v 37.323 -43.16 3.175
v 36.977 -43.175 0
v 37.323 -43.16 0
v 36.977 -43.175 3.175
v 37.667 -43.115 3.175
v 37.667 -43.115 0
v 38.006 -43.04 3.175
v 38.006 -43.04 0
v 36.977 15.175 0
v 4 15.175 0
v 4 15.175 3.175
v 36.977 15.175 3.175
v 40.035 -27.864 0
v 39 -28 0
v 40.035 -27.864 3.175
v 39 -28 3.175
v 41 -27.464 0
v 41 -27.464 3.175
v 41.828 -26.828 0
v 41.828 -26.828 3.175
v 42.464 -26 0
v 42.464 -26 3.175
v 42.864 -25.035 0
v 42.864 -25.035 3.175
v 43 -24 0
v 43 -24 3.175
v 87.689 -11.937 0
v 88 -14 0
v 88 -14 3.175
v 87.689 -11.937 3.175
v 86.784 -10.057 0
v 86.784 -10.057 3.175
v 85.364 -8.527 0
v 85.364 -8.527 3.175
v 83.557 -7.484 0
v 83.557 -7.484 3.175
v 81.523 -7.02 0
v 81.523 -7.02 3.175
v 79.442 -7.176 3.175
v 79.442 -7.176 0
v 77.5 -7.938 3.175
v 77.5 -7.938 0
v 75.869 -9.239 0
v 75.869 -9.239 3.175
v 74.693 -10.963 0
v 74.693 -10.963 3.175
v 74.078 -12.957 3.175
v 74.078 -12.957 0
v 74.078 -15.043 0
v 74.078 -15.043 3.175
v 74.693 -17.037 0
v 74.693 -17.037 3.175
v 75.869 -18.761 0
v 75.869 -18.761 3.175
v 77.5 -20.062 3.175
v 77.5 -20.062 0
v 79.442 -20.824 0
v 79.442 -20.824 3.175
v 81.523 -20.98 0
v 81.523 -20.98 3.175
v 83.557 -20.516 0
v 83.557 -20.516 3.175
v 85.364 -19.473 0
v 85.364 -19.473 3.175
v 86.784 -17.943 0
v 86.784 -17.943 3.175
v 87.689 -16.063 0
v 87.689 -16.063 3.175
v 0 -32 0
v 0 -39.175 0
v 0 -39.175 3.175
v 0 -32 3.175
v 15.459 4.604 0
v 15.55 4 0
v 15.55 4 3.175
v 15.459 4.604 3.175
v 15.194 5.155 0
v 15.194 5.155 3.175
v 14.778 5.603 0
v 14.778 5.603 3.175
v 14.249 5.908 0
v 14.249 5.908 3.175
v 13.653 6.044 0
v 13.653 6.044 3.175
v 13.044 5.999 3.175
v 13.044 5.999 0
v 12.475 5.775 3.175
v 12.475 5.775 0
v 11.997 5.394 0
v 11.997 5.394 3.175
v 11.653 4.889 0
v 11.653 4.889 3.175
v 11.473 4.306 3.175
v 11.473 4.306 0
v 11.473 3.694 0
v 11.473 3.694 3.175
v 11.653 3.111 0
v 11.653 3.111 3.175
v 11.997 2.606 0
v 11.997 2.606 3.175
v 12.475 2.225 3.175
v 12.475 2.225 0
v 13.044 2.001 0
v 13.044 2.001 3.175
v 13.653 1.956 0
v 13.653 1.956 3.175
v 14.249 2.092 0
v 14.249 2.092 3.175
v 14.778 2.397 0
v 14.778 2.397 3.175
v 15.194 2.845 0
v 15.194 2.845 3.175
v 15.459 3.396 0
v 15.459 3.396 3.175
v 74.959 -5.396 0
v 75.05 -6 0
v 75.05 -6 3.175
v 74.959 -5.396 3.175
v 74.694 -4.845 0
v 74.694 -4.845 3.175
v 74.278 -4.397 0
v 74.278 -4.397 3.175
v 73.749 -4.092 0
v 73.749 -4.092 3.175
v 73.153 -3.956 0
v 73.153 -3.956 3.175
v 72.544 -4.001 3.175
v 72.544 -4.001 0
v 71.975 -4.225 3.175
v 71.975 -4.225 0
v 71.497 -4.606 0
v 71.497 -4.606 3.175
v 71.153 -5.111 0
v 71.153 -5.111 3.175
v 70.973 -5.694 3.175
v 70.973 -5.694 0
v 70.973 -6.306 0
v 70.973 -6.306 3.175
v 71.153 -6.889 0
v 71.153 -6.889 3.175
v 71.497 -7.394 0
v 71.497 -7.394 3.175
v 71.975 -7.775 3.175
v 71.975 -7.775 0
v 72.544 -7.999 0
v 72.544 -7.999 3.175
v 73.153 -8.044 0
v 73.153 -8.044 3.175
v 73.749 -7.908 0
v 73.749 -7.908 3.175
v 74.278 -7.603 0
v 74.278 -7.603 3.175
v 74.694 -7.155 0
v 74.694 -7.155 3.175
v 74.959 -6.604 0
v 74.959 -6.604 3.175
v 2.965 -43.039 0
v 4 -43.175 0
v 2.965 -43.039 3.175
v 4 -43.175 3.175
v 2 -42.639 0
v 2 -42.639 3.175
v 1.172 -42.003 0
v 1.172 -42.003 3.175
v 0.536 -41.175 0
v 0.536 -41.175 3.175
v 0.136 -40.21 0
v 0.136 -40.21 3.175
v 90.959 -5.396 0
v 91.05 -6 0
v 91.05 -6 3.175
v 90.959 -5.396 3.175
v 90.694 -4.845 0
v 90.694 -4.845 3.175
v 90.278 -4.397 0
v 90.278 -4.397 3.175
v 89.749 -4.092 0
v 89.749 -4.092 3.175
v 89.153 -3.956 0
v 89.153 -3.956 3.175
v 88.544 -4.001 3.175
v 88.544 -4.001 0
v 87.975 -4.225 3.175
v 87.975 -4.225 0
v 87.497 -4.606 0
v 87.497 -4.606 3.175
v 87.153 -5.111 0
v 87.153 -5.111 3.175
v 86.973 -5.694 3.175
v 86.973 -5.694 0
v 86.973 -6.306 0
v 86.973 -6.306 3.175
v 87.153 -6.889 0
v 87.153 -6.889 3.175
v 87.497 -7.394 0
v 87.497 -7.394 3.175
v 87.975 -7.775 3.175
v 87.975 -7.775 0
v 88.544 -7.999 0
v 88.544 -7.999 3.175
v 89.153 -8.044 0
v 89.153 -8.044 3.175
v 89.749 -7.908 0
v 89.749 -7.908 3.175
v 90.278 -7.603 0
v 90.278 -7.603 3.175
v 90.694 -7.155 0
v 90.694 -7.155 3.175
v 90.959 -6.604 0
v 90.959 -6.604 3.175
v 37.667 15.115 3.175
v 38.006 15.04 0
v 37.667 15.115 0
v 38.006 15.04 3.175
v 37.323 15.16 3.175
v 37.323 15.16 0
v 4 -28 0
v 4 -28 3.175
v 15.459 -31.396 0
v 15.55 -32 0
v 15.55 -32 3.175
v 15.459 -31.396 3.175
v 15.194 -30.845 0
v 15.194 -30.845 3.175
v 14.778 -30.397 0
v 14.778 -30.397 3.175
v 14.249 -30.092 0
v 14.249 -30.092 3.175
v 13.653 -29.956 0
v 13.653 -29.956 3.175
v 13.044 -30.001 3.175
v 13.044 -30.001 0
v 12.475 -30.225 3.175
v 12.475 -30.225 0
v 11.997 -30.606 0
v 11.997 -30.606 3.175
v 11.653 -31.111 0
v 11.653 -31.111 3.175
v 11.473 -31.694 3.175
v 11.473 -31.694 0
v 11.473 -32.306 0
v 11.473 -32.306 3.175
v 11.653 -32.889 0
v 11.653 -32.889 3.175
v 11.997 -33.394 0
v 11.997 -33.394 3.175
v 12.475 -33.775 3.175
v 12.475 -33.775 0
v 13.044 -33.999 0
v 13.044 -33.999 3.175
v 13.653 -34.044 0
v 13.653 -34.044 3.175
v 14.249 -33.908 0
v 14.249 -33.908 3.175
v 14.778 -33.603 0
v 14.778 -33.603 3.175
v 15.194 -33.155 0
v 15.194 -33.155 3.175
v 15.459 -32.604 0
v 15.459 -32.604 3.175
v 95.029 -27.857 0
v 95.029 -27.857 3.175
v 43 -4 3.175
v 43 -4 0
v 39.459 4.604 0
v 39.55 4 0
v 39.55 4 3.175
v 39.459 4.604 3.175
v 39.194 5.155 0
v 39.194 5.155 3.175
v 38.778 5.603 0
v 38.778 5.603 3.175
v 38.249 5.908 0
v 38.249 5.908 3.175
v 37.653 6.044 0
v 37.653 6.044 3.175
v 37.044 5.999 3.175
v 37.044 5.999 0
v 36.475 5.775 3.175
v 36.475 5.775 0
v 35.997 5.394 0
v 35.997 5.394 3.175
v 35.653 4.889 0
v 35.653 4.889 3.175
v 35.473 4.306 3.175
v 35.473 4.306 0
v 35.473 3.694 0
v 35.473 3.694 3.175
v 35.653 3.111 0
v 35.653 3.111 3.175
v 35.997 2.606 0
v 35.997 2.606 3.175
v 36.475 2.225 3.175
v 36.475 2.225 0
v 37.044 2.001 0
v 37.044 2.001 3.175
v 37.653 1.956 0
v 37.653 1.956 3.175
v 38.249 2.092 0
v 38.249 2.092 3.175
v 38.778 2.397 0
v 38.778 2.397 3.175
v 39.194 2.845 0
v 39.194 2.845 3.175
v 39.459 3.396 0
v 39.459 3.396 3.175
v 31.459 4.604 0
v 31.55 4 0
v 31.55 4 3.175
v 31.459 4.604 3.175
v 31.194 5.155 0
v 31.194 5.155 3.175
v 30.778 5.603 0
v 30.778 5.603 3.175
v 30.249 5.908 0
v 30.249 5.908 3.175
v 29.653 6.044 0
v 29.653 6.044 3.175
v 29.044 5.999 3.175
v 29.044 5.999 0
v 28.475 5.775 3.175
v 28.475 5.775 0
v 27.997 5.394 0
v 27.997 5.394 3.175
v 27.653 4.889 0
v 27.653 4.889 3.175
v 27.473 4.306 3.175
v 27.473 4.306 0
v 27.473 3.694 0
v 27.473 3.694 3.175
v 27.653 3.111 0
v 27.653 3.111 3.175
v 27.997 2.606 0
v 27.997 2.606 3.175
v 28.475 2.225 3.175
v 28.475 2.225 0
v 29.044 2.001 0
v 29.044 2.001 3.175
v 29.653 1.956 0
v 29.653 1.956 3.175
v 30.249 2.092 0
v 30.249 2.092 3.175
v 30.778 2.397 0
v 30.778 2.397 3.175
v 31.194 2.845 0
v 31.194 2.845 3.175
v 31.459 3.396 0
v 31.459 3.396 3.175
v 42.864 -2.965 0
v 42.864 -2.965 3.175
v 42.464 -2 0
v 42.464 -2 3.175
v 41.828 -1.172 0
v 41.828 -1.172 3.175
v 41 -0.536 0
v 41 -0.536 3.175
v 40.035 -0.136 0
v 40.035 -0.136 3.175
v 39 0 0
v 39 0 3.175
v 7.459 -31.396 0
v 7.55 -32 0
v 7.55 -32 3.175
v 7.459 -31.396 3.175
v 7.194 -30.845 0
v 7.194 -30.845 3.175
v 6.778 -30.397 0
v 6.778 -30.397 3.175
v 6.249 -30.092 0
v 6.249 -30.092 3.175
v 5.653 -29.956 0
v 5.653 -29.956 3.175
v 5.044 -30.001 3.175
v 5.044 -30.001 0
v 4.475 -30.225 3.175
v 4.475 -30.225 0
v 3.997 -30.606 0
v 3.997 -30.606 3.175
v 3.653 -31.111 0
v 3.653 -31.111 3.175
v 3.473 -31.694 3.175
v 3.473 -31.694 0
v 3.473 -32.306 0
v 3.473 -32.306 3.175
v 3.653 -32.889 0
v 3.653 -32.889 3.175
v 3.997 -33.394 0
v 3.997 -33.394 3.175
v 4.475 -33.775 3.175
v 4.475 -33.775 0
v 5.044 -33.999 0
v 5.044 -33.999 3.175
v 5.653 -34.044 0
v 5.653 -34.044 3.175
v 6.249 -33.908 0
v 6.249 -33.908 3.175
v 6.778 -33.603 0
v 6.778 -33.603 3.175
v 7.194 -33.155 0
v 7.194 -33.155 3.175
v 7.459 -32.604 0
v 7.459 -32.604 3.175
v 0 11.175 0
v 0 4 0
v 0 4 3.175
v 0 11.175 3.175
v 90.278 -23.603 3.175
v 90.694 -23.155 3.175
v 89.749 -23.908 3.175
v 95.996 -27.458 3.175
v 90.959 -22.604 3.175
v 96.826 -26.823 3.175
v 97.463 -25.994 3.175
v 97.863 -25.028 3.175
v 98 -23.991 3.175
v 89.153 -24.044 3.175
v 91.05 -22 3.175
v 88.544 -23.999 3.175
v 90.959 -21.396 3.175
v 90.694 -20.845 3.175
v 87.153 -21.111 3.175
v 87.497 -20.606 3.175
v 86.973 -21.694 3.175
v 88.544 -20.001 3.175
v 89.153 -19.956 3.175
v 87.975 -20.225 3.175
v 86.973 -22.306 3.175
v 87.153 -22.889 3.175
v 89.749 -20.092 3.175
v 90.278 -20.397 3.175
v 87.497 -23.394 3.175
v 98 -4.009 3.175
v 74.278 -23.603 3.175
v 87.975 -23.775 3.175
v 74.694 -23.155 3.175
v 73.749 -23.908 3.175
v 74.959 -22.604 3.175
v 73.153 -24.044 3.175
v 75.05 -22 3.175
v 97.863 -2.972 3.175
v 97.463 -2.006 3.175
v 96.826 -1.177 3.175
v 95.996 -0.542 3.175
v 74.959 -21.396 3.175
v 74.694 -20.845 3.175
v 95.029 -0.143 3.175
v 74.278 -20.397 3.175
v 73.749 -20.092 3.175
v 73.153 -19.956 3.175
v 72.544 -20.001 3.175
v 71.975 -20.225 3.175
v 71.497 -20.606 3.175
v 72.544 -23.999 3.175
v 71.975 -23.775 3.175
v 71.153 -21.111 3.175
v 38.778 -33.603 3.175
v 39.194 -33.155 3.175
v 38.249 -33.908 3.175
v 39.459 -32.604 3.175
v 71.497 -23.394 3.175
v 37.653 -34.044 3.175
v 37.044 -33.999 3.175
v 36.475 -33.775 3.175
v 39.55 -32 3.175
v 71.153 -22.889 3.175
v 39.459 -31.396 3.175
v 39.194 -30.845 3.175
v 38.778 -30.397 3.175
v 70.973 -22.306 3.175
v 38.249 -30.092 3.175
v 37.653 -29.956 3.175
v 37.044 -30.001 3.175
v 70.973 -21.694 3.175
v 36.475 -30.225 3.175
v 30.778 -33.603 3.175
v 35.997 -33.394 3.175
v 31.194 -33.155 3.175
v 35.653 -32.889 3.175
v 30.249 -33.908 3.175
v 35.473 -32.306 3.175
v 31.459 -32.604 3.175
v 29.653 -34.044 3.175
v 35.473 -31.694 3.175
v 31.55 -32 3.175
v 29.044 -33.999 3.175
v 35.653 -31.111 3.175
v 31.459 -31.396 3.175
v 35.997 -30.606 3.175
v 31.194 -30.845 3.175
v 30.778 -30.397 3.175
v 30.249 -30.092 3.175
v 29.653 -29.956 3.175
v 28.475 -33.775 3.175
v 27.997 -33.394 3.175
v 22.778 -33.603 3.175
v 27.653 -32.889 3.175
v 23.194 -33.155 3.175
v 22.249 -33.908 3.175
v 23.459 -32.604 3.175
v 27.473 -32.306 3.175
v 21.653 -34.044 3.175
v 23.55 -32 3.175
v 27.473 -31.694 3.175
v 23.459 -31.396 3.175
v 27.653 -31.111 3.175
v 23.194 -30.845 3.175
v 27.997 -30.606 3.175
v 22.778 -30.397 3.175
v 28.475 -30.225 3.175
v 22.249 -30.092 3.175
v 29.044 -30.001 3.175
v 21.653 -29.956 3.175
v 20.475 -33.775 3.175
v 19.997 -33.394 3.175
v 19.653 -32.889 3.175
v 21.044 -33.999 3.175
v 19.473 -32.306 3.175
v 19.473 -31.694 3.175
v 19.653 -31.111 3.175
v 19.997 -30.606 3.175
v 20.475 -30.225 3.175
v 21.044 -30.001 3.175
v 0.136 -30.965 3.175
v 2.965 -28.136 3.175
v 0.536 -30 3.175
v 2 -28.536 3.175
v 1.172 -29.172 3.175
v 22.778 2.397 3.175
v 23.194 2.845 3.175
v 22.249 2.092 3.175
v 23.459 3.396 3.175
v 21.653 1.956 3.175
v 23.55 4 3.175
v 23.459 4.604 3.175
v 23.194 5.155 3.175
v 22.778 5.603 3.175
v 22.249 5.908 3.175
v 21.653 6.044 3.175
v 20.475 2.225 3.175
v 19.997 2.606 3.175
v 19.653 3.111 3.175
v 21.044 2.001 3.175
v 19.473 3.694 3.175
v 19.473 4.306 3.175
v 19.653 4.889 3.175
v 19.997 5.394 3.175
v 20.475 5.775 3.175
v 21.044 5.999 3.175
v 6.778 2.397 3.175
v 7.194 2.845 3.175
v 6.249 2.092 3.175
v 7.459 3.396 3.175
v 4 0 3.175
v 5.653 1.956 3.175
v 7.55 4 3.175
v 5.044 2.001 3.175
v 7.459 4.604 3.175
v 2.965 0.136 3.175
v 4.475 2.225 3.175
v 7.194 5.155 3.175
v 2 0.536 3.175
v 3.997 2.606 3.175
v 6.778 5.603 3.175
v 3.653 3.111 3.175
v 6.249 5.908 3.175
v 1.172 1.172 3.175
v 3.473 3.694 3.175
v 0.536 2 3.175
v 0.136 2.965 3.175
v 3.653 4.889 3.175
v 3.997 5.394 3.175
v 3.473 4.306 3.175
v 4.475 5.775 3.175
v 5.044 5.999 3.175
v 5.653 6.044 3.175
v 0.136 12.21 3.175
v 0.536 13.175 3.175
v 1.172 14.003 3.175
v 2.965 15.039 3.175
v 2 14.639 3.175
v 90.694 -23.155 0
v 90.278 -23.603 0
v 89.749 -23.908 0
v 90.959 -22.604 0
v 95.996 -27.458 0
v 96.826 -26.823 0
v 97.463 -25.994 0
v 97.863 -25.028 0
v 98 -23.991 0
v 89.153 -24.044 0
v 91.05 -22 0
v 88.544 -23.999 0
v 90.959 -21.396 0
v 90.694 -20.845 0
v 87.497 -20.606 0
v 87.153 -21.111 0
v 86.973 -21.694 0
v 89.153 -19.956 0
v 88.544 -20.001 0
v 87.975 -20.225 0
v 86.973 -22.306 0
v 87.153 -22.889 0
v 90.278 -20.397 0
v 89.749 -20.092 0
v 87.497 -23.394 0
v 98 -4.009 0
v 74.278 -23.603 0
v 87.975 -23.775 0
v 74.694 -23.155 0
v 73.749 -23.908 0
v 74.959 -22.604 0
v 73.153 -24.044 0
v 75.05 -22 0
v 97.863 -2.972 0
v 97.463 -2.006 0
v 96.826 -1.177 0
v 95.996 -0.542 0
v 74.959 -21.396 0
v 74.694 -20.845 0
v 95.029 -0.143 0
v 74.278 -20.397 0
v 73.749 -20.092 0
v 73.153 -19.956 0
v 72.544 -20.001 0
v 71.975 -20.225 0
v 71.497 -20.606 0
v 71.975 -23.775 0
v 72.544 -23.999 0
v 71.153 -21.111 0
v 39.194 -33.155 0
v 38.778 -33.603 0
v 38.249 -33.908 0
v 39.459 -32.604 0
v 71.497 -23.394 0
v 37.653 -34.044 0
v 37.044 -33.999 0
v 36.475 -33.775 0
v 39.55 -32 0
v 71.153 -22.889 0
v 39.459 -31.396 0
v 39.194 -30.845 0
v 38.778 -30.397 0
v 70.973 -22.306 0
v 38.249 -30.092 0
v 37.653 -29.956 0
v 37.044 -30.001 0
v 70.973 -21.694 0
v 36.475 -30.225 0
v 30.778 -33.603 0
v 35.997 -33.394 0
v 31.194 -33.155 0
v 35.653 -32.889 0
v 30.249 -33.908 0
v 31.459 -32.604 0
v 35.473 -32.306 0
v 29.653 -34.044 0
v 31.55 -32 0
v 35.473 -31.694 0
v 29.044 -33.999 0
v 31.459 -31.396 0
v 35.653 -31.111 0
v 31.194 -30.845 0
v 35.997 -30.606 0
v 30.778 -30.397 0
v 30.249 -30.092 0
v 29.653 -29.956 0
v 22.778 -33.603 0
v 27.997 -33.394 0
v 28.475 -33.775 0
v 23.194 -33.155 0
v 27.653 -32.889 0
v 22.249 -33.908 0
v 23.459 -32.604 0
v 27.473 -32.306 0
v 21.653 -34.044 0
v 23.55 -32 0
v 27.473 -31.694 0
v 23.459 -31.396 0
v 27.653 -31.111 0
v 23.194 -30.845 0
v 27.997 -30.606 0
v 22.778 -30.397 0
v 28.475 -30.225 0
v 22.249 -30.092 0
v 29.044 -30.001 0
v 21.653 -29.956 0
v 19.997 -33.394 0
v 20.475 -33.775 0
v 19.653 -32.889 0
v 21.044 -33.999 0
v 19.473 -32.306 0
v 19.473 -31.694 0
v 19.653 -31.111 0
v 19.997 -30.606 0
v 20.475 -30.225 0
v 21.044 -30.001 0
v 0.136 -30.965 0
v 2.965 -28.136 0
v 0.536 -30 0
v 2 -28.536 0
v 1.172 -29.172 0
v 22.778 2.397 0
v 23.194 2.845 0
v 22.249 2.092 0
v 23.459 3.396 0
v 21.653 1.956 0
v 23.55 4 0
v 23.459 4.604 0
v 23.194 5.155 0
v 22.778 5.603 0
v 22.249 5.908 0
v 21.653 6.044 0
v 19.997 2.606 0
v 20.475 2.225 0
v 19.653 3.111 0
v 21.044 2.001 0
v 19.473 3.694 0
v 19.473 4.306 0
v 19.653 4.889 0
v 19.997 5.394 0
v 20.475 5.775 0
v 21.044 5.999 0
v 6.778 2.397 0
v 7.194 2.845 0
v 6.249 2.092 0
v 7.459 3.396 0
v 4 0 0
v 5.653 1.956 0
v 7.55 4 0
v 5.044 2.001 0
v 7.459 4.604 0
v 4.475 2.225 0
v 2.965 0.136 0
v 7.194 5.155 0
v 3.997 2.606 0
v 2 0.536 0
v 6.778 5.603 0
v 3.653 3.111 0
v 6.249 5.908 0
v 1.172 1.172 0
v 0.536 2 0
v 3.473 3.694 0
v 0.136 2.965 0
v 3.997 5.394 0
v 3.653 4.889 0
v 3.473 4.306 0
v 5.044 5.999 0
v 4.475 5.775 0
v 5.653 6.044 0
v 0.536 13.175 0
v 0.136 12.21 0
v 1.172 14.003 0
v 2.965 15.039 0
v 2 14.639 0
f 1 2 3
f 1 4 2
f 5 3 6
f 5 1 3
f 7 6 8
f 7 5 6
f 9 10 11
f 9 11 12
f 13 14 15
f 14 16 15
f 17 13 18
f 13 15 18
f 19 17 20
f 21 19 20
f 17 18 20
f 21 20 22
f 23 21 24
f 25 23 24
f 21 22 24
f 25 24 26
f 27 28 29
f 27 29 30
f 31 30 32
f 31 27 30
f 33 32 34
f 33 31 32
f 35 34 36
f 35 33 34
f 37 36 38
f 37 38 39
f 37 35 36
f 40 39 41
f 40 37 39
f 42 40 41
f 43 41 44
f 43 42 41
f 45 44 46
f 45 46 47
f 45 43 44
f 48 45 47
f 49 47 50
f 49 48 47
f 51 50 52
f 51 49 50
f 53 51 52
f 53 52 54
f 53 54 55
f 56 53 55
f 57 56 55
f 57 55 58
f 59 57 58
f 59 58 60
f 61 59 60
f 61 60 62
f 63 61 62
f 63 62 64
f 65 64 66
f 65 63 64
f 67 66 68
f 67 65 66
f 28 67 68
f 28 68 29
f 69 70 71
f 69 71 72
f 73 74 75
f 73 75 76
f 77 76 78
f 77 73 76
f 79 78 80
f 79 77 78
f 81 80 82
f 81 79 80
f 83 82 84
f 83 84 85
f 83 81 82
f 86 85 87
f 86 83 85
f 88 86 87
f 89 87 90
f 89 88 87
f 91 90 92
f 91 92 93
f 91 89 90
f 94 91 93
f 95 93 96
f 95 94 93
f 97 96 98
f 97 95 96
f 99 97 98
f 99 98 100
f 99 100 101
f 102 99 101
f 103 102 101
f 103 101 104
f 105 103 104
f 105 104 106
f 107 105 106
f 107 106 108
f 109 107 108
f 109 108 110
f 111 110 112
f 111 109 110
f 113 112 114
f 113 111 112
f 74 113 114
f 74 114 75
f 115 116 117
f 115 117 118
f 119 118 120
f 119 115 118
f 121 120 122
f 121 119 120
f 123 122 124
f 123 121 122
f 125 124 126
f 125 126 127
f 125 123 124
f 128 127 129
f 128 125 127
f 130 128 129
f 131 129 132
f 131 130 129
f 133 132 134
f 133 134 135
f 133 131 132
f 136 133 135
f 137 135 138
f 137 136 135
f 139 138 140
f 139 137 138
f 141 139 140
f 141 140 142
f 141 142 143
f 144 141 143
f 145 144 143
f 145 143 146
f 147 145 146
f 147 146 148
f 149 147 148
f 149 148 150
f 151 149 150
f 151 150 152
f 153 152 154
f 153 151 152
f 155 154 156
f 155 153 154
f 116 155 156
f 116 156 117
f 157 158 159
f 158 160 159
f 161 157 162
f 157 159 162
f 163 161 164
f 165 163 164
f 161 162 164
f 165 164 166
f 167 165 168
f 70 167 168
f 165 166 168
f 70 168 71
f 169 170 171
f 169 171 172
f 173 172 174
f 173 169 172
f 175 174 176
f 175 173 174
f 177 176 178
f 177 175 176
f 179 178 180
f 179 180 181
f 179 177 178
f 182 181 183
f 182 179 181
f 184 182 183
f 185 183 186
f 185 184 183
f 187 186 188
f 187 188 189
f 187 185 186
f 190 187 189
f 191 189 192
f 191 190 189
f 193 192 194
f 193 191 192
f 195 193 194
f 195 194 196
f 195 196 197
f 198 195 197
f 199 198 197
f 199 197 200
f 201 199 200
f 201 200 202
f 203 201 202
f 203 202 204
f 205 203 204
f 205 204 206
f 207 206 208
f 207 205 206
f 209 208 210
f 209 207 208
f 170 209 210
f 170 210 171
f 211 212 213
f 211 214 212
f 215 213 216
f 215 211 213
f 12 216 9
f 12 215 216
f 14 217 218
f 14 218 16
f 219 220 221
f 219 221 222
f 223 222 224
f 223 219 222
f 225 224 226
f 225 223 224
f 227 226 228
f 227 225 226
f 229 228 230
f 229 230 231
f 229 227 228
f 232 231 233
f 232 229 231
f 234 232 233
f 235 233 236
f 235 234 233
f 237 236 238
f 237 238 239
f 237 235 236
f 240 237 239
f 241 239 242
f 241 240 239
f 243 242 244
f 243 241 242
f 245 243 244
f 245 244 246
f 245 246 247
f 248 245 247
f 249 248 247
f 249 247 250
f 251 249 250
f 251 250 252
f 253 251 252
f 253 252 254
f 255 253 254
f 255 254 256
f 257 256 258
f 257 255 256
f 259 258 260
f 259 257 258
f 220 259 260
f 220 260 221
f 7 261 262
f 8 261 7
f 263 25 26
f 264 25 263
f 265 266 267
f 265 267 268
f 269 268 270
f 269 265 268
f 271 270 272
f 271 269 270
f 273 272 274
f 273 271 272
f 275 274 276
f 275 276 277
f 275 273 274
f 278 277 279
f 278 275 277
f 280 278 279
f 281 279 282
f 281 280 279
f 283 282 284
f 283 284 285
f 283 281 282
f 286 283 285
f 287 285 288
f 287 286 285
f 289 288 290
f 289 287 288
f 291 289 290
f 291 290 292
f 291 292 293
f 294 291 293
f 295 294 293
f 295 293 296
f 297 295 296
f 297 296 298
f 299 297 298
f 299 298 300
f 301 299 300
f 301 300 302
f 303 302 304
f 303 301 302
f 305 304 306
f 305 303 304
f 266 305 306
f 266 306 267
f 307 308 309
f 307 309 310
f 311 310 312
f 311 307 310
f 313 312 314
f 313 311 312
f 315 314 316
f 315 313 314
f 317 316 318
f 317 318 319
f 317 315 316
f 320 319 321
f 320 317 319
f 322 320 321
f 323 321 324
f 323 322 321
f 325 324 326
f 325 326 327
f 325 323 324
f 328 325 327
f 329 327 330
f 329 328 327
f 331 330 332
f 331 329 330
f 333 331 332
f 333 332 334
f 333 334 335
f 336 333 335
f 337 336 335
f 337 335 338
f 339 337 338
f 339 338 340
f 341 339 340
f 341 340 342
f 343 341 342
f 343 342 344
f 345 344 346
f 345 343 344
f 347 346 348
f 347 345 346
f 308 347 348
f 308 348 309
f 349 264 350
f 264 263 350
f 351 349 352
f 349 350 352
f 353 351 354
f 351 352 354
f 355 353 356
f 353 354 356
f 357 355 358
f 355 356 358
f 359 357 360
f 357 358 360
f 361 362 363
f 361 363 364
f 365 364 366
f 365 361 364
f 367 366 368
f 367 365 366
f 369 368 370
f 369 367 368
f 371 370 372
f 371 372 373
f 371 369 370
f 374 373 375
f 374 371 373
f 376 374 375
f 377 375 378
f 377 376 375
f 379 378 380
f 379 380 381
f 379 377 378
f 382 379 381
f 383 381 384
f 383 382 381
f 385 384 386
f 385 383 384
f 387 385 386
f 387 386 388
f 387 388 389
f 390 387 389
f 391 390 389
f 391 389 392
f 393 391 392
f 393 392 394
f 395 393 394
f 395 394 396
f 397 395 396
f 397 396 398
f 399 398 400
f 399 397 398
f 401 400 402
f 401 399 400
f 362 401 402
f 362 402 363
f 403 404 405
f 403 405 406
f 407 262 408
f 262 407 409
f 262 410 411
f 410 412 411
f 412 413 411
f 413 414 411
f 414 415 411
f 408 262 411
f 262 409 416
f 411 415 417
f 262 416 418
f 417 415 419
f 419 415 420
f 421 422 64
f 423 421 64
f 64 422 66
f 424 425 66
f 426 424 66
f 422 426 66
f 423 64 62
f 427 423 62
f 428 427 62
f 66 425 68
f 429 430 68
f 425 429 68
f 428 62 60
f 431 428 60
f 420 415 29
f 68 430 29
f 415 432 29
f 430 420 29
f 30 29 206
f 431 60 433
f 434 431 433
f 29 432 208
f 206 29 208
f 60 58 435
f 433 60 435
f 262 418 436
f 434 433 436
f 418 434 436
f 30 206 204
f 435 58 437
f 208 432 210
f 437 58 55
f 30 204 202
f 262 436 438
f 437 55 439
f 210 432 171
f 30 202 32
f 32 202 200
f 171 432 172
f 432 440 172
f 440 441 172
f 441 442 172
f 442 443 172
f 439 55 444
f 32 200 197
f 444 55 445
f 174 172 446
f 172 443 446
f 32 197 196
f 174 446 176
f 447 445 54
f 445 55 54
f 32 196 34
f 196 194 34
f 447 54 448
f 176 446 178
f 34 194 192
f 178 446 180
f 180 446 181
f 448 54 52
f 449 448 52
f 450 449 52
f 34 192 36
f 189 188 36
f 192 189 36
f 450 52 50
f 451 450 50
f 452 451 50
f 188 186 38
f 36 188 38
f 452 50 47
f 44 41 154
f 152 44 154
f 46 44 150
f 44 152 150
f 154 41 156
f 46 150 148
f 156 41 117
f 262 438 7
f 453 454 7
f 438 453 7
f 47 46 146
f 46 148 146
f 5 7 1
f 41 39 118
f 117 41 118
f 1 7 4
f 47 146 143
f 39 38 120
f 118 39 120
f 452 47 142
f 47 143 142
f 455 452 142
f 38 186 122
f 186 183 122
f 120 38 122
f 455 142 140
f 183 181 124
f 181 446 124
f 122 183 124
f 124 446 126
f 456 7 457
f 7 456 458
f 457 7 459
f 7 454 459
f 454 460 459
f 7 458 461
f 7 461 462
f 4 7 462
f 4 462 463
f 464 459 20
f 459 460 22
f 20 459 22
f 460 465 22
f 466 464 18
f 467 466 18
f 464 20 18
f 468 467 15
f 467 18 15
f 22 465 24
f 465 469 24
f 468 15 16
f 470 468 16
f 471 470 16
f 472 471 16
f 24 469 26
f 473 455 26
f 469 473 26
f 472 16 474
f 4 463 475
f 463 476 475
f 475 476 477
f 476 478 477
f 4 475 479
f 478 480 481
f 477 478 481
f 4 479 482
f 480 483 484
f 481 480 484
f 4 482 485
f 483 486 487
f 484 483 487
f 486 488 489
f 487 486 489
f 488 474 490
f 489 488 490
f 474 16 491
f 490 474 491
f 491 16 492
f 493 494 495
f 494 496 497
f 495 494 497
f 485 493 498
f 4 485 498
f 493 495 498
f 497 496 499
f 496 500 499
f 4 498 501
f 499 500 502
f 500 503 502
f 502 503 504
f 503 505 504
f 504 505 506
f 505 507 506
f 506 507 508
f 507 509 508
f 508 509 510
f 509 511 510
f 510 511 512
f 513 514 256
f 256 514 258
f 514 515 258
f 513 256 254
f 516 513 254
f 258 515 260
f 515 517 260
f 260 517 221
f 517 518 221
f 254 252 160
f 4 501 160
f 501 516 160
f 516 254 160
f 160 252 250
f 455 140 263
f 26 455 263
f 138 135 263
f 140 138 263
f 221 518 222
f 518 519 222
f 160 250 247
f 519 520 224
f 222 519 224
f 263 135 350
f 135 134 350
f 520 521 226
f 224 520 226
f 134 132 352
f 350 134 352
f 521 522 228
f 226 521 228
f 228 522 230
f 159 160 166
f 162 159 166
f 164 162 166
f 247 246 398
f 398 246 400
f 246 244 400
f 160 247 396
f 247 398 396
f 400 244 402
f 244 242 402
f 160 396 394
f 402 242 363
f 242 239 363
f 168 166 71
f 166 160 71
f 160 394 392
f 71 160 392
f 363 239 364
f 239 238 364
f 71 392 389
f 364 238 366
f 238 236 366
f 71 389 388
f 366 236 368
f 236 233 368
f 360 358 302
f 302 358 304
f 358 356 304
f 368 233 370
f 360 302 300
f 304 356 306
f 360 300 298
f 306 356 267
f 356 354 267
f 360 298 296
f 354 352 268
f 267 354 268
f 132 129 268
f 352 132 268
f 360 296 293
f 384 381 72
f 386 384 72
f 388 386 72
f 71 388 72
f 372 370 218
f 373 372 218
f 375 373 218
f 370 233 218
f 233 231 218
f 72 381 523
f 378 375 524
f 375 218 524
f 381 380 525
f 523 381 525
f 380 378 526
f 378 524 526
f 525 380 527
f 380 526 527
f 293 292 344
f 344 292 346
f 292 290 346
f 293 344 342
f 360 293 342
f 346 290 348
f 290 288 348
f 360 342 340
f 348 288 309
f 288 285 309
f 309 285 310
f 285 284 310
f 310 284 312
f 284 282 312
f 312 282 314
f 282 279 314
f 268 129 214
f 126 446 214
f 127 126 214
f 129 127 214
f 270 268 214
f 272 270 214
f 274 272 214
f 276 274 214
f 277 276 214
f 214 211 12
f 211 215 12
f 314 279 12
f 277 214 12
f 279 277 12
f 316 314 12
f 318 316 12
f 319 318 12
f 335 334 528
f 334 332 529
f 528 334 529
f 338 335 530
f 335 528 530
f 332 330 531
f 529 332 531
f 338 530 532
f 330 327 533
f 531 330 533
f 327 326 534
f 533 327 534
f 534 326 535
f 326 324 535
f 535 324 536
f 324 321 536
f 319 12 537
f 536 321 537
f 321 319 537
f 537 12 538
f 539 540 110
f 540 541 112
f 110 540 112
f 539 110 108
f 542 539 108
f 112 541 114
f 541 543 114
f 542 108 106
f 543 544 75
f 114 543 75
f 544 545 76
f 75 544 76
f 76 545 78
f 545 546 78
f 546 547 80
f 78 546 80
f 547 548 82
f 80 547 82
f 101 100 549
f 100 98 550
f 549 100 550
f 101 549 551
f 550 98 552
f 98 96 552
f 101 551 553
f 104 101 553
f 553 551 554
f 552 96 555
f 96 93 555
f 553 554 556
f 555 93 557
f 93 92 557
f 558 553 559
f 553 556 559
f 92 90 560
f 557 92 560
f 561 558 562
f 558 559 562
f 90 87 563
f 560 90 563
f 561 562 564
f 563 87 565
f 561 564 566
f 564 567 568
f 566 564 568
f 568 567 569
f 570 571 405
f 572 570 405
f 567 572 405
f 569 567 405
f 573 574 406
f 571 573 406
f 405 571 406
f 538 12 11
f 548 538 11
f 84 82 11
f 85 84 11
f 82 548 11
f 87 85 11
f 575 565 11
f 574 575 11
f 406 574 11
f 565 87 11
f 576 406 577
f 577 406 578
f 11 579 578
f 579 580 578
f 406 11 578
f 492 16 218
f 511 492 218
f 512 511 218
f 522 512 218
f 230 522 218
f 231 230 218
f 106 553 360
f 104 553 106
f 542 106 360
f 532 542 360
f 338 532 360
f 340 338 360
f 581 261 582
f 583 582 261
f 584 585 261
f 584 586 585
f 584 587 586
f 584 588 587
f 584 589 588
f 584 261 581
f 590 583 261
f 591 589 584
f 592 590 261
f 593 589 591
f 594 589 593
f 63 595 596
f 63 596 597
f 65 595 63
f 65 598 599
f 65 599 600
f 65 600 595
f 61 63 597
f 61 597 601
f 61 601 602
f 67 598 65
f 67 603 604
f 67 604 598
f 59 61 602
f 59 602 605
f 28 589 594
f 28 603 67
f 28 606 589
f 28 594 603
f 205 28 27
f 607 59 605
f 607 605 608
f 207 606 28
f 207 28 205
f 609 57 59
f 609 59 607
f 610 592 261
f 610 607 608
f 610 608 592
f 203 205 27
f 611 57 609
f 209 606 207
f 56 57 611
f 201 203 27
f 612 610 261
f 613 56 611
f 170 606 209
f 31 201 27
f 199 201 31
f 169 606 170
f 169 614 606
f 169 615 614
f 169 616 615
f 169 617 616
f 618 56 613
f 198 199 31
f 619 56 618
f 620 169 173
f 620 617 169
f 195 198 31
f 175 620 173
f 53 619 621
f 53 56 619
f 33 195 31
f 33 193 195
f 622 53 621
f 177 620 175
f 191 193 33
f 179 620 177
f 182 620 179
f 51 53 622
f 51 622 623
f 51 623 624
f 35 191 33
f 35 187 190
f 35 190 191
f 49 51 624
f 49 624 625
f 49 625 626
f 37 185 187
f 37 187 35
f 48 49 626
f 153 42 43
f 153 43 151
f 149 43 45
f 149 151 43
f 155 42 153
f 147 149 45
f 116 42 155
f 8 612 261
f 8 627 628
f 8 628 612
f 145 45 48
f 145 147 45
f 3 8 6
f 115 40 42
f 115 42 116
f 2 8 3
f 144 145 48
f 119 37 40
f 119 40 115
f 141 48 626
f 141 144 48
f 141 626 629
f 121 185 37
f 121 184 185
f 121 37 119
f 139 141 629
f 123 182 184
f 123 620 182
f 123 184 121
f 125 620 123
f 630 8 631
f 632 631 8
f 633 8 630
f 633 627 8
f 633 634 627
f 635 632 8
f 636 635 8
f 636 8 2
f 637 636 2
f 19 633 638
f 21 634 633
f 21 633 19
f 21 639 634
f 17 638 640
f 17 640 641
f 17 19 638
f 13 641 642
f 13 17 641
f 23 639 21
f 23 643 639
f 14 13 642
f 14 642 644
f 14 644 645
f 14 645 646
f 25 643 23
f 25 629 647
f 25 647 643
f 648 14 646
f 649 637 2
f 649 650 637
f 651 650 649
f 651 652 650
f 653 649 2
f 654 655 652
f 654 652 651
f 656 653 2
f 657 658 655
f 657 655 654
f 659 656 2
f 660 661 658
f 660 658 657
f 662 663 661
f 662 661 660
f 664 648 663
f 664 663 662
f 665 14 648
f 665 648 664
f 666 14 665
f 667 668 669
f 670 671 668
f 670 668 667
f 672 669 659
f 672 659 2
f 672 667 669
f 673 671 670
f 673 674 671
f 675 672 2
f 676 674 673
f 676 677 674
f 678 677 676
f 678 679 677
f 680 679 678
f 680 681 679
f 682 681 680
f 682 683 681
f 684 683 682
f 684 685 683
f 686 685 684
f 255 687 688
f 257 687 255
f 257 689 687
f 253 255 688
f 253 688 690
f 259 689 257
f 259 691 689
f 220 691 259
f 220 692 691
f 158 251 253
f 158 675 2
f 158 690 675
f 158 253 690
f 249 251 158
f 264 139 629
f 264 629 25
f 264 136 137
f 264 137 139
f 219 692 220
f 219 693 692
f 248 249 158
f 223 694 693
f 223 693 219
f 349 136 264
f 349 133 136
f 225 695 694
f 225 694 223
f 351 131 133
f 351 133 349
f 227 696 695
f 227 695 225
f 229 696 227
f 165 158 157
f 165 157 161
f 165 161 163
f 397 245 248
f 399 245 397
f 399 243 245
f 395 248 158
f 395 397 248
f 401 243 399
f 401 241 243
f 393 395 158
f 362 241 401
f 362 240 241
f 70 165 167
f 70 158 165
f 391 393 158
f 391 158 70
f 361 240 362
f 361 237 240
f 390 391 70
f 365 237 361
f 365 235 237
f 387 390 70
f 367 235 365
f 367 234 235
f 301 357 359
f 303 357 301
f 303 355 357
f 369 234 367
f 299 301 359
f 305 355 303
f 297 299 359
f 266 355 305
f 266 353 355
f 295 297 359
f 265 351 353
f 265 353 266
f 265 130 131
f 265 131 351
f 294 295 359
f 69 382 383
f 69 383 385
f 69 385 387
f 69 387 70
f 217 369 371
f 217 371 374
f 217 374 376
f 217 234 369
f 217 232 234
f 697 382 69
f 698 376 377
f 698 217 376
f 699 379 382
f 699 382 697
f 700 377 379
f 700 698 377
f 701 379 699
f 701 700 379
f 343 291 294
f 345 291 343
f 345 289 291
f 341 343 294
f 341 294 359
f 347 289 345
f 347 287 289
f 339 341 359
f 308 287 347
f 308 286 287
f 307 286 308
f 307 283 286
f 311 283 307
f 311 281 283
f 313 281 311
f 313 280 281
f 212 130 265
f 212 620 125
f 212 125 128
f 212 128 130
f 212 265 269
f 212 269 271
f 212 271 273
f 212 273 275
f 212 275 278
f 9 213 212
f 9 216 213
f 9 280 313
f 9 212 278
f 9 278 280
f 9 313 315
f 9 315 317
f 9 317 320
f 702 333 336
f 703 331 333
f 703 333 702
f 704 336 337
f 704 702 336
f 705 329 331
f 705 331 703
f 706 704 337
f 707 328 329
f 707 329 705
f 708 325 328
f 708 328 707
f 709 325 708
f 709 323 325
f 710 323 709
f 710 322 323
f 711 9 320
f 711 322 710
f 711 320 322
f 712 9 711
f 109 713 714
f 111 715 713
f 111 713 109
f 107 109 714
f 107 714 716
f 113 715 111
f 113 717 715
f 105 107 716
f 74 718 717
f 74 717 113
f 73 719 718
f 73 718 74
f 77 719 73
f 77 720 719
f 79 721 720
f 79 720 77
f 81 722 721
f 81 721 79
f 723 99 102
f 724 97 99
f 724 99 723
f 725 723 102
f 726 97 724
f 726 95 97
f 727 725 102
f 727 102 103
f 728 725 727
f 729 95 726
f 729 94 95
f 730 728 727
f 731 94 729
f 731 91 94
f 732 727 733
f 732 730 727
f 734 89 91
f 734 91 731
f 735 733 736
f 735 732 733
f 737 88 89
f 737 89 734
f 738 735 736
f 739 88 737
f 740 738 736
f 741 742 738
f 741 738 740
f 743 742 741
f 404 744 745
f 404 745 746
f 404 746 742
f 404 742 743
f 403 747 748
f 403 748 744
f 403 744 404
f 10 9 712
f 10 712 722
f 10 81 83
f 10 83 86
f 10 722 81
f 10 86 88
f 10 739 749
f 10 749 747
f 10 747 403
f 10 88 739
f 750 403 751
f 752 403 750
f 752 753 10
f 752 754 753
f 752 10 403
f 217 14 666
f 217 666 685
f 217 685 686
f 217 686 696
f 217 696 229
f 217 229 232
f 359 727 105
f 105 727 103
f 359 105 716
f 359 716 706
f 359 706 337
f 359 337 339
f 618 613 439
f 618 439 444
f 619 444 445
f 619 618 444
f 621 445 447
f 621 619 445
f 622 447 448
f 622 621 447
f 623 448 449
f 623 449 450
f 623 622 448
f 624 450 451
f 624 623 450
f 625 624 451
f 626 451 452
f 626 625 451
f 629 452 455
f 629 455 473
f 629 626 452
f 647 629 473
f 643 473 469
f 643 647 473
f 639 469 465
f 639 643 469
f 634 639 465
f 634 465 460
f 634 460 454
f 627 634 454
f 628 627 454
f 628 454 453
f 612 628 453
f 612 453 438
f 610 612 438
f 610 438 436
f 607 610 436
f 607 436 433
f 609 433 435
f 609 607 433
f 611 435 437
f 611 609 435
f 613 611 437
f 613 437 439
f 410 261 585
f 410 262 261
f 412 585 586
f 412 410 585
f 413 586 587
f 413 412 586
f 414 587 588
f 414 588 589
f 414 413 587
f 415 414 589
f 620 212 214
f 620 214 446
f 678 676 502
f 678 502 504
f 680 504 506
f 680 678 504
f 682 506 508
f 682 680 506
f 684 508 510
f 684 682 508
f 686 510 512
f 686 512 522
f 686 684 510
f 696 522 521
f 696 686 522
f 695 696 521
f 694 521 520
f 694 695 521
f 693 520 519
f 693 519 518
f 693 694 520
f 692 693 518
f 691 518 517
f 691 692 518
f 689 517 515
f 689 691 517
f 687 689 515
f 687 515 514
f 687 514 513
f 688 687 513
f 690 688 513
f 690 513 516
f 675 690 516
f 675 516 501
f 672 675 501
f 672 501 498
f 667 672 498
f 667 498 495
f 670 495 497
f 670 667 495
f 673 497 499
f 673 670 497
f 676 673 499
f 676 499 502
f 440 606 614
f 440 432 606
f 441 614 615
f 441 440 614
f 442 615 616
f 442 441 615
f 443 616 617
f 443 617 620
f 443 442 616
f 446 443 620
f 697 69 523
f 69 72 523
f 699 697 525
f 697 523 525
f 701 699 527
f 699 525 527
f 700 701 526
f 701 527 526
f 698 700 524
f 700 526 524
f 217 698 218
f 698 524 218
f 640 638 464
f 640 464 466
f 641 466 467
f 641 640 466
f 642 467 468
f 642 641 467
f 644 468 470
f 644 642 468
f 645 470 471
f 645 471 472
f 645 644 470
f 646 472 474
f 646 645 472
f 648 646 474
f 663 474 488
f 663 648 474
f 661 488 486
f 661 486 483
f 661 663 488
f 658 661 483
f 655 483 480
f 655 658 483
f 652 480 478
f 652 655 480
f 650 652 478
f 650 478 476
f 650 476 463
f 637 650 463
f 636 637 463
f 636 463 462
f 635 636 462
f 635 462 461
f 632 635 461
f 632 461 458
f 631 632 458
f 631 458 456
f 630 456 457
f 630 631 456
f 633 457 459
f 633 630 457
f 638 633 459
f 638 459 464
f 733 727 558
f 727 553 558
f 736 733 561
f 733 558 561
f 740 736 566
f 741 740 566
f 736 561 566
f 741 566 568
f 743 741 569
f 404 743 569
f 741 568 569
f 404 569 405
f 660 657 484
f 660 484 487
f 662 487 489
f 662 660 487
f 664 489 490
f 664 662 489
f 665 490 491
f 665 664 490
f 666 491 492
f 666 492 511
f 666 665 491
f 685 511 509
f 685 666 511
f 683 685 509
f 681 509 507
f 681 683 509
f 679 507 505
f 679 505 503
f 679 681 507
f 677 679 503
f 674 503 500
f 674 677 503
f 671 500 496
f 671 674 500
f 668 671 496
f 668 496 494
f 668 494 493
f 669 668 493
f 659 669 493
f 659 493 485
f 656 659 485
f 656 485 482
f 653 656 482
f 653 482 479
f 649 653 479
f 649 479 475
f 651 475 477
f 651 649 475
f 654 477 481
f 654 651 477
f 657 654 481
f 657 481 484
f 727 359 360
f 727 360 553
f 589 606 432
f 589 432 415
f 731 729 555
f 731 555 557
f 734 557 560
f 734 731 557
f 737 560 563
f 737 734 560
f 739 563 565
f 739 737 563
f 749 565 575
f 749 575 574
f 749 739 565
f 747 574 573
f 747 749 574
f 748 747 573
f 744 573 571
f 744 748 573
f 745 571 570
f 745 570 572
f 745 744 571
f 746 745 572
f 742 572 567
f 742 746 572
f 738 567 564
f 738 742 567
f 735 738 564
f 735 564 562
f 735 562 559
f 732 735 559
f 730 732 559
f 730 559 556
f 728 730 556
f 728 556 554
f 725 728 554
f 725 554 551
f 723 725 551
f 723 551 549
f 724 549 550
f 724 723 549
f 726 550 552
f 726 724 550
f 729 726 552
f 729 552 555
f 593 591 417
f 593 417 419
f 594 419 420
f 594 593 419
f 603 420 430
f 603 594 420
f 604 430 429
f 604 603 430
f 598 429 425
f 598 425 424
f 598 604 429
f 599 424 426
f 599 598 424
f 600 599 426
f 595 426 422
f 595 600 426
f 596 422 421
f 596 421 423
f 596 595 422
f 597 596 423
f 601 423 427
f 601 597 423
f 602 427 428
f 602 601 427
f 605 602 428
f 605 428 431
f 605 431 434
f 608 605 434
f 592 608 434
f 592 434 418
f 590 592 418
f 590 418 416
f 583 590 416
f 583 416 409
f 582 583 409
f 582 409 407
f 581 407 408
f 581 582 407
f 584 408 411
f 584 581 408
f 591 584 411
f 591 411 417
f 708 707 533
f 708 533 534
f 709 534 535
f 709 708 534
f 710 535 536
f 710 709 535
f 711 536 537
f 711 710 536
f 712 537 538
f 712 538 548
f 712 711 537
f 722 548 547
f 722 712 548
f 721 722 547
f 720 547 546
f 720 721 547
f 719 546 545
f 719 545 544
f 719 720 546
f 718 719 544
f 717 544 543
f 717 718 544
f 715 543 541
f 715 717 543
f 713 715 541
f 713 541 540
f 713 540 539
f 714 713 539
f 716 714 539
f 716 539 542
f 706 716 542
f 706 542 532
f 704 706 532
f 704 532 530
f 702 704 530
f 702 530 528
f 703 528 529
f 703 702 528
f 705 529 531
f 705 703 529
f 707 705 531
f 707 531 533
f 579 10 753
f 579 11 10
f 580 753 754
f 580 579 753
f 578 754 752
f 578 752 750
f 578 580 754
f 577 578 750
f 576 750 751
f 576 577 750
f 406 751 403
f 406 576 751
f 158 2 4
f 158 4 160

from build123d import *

# Parameters (mm, degrees)
SKETCH1_R           = 7
SKETCH1_R_2         = 2.05
BOSS_EXTRUDE2_DEPTH = 3.175
FILLET2_R           = 4


with BuildPart() as part:
    # Sketch1 → Boss-Extrude2 (new body)
    with BuildSketch(Plane.XY):
        Polygon((37.5, -43.175), (0, -43.175), (0, -28), (43, -28), (43, 0), (0, 0), (0, 15.175), (37.5, 15.175), (98, -0.934242296), (98, -27.065757704), align=None)
        with Locations((81, -14)):
            Circle(SKETCH1_R, mode=Mode.SUBTRACT)
        with Locations((13.5, -32)):
            Circle(SKETCH1_R_2, mode=Mode.SUBTRACT)
        with Locations((29.5, -32)):
            Circle(SKETCH1_R_2, mode=Mode.SUBTRACT)
        with Locations((73, -6)):
            Circle(SKETCH1_R_2, mode=Mode.SUBTRACT)
        with Locations((89, -6)):
            Circle(SKETCH1_R_2, mode=Mode.SUBTRACT)
        with Locations((89, -22)):
            Circle(SKETCH1_R_2, mode=Mode.SUBTRACT)
        with Locations((73, -22)):
            Circle(SKETCH1_R_2, mode=Mode.SUBTRACT)
        with Locations((5.5, 4)):
            Circle(SKETCH1_R_2, mode=Mode.SUBTRACT)
        with Locations((13.5, 4)):
            Circle(SKETCH1_R_2, mode=Mode.SUBTRACT)
        with Locations((21.5, 4)):
            Circle(SKETCH1_R_2, mode=Mode.SUBTRACT)
        with Locations((29.5, 4)):
            Circle(SKETCH1_R_2, mode=Mode.SUBTRACT)
        with Locations((37.5, 4)):
            Circle(SKETCH1_R_2, mode=Mode.SUBTRACT)
        with Locations((37.5, -32)):
            Circle(SKETCH1_R_2, mode=Mode.SUBTRACT)
        with Locations((21.5, -32)):
            Circle(SKETCH1_R_2, mode=Mode.SUBTRACT)
        with Locations((5.5, -32)):
            Circle(SKETCH1_R_2, mode=Mode.SUBTRACT)
    extrude(amount=BOSS_EXTRUDE2_DEPTH)

    # Fillet2
    fillet2_edges = [part.edges().sort_by_distance(p)[0] for p in [
        (0, -43.175, 1.5875),
        (0, -28, 1.5875),
        (43, -28, 1.5875),
        (43, 0, 1.5875),
        (0, 0, 1.5875),
        (0, 15.175, 1.5875),
        (37.5, 15.175, 1.5875),
        (98, -0.934242296, 1.5875),
        (98, -27.065757704, 1.5875),
        (37.5, -43.175, 1.5875),
    ]]
    fillet(fillet2_edges, radius=FILLET2_R)


solid = part.part
